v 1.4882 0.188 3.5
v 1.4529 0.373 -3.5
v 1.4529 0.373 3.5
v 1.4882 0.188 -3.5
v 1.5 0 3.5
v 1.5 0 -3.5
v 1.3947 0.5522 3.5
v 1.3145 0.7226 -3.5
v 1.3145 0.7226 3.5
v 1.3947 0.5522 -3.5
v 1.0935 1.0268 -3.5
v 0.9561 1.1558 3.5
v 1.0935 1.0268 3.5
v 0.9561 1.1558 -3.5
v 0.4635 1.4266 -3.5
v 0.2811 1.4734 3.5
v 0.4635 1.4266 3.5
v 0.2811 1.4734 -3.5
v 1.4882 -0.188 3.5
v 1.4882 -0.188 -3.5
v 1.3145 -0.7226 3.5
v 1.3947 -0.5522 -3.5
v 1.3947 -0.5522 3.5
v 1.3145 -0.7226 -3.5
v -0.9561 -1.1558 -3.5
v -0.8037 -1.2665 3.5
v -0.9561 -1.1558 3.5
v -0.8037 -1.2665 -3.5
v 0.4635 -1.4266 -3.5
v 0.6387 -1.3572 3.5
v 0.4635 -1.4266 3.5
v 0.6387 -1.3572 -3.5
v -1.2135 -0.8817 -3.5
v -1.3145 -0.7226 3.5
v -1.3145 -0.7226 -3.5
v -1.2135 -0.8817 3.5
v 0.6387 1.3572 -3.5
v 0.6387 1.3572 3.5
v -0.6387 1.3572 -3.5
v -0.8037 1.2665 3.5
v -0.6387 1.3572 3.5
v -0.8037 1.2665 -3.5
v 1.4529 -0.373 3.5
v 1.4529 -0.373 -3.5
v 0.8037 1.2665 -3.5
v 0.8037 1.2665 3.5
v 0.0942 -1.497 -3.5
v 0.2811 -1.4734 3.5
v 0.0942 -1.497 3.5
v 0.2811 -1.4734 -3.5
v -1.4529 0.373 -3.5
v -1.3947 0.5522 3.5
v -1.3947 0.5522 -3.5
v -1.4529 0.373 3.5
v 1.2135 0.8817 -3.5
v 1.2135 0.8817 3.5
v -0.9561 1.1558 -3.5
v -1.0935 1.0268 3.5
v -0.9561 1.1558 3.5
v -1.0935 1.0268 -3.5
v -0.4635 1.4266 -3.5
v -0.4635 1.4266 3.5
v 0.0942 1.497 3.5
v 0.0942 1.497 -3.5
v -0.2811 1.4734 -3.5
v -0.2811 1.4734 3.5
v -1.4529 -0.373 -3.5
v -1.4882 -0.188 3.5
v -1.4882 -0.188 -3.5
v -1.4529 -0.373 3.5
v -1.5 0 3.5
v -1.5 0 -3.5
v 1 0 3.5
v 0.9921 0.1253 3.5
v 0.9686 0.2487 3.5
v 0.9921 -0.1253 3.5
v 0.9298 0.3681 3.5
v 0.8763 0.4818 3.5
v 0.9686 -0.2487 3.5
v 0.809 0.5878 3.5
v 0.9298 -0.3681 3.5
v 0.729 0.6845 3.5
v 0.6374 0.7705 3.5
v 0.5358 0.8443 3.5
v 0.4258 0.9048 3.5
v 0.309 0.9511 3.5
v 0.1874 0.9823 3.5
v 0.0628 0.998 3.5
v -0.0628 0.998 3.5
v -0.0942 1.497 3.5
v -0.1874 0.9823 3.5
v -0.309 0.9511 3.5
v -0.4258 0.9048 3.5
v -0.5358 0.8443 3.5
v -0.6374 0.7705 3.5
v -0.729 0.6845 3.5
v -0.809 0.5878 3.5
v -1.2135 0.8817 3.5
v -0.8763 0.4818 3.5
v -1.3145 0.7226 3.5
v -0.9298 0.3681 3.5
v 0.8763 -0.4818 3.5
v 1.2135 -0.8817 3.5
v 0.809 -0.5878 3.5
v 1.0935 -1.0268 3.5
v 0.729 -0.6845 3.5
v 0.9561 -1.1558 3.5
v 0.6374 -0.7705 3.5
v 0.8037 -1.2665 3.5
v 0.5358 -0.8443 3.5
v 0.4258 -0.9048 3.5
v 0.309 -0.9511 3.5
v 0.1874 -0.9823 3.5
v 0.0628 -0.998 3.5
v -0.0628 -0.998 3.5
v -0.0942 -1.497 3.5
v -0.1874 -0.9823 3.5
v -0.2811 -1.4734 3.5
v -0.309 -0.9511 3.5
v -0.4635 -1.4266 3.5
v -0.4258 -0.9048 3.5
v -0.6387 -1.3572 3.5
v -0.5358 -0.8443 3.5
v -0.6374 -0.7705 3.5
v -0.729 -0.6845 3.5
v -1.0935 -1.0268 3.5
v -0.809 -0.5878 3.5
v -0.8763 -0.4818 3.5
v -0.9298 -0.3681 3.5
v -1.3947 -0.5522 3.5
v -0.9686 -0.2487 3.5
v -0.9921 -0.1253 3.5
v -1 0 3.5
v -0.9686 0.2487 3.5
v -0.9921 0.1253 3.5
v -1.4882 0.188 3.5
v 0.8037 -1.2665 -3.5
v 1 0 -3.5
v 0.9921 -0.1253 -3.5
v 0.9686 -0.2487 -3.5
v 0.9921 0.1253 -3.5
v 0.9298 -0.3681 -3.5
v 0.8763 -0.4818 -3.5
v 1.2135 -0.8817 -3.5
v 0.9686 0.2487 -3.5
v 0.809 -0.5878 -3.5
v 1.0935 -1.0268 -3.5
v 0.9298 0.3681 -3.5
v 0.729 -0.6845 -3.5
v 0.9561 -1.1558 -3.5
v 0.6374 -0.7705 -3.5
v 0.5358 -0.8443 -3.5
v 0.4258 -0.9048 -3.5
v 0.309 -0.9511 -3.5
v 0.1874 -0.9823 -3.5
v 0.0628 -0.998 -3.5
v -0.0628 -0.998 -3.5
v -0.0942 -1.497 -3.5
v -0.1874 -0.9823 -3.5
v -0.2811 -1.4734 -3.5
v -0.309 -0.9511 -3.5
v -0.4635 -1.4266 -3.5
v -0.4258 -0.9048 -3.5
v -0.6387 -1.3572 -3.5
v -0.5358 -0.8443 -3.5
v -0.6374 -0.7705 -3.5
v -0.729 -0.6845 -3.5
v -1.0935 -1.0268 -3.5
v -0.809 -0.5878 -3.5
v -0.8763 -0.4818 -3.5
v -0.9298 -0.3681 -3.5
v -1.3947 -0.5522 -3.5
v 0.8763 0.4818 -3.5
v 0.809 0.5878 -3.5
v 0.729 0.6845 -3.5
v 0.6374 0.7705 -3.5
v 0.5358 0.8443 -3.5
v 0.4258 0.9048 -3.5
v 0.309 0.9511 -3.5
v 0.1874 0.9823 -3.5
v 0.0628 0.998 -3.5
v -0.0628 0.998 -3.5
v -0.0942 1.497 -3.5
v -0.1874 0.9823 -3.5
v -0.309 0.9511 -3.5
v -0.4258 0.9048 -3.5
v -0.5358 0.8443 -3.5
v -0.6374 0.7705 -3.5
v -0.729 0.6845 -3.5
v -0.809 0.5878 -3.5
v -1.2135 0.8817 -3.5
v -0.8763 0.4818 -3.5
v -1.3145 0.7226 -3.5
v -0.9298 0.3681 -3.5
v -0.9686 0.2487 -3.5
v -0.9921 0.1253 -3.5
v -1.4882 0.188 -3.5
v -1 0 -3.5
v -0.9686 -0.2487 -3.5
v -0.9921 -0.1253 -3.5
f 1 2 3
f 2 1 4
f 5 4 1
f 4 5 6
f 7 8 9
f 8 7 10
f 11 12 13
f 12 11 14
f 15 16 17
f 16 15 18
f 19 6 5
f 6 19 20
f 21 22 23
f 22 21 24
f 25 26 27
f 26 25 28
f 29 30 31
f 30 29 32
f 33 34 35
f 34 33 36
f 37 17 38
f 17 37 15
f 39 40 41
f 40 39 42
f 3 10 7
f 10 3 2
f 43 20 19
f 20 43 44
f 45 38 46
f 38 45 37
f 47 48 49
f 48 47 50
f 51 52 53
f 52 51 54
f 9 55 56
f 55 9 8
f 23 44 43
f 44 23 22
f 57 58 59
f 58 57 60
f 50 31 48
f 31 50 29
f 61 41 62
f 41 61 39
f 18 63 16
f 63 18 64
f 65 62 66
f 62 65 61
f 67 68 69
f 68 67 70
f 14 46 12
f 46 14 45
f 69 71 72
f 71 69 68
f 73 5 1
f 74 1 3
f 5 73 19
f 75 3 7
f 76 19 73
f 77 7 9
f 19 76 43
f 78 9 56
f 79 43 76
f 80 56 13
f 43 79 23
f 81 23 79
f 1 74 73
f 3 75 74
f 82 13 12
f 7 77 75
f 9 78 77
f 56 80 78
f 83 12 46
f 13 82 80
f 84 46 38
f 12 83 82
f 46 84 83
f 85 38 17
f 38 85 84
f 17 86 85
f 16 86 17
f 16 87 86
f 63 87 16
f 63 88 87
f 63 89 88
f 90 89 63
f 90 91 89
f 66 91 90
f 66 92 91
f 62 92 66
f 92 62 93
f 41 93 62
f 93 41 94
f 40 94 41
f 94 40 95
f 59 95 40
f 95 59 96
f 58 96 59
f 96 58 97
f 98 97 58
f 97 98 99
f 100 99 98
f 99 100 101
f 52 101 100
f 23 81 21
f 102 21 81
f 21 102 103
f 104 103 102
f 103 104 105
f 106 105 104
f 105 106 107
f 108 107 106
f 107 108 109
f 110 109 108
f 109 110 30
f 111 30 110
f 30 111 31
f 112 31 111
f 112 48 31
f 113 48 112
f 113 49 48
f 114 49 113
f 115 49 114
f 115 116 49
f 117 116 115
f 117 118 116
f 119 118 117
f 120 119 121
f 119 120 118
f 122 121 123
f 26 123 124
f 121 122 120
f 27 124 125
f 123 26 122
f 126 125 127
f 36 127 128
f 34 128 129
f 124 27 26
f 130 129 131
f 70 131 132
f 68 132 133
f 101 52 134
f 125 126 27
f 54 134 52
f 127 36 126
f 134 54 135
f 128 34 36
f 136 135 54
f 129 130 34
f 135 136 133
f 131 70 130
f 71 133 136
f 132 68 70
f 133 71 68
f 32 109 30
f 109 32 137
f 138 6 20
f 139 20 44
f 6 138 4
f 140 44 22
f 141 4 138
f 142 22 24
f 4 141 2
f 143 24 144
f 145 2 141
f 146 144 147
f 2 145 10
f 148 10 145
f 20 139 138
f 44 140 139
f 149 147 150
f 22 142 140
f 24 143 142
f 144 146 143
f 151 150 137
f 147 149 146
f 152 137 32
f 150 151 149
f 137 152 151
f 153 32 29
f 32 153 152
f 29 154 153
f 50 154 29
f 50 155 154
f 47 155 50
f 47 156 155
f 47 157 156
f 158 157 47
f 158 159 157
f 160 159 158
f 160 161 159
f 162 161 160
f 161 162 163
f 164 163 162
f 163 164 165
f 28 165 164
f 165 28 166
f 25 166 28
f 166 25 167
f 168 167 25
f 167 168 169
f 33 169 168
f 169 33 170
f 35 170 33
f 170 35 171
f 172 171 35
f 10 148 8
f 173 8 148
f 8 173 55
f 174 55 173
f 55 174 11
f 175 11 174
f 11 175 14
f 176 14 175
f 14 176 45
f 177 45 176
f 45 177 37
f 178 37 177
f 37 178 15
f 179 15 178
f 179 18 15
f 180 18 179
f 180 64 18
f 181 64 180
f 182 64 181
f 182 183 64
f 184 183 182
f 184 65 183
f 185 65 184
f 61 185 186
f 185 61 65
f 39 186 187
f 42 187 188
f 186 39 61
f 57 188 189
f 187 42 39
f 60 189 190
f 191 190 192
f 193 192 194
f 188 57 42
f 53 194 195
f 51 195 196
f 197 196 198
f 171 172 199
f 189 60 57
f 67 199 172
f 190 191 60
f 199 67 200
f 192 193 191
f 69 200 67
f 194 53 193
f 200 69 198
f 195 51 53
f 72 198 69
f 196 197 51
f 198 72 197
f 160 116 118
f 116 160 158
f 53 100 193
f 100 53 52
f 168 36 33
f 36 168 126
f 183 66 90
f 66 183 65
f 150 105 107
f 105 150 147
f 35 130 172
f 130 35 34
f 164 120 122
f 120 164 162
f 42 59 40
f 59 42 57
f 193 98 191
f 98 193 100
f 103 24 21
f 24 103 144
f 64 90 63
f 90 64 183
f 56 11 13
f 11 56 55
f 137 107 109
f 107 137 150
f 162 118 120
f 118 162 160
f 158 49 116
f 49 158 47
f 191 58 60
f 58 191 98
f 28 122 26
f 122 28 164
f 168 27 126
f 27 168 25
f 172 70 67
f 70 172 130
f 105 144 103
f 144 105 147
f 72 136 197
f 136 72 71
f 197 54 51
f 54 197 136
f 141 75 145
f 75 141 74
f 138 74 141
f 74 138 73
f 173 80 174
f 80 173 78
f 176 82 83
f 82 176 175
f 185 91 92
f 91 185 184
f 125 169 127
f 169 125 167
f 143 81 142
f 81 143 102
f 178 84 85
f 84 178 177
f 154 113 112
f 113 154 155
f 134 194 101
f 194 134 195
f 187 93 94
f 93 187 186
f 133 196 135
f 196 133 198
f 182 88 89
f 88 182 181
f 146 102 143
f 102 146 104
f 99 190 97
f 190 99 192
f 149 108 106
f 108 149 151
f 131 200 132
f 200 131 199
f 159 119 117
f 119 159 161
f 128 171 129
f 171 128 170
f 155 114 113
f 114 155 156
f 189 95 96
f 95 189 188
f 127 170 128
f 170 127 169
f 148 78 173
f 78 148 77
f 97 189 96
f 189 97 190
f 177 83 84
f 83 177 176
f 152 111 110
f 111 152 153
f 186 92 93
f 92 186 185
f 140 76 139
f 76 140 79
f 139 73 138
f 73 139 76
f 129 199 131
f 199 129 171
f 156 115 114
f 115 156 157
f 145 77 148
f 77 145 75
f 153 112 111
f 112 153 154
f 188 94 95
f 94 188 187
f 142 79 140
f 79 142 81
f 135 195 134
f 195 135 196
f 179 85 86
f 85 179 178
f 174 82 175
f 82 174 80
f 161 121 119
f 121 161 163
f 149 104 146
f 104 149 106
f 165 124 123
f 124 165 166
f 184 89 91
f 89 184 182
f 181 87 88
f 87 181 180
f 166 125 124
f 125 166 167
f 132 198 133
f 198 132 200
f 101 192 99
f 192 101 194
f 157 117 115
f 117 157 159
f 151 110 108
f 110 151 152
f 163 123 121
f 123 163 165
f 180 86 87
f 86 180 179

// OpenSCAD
$fn = 50;


difference() {
	union() {
		translate(v = [0, 0, -3.5000000000]) {
			cylinder(h = 7, r = 1.5000000000);
		}
	}
	union() {
		translate(v = [0, 0, -100.0000000000]) {
			cylinder(h = 200, r = 1.0000000000);
		}
	}
}
